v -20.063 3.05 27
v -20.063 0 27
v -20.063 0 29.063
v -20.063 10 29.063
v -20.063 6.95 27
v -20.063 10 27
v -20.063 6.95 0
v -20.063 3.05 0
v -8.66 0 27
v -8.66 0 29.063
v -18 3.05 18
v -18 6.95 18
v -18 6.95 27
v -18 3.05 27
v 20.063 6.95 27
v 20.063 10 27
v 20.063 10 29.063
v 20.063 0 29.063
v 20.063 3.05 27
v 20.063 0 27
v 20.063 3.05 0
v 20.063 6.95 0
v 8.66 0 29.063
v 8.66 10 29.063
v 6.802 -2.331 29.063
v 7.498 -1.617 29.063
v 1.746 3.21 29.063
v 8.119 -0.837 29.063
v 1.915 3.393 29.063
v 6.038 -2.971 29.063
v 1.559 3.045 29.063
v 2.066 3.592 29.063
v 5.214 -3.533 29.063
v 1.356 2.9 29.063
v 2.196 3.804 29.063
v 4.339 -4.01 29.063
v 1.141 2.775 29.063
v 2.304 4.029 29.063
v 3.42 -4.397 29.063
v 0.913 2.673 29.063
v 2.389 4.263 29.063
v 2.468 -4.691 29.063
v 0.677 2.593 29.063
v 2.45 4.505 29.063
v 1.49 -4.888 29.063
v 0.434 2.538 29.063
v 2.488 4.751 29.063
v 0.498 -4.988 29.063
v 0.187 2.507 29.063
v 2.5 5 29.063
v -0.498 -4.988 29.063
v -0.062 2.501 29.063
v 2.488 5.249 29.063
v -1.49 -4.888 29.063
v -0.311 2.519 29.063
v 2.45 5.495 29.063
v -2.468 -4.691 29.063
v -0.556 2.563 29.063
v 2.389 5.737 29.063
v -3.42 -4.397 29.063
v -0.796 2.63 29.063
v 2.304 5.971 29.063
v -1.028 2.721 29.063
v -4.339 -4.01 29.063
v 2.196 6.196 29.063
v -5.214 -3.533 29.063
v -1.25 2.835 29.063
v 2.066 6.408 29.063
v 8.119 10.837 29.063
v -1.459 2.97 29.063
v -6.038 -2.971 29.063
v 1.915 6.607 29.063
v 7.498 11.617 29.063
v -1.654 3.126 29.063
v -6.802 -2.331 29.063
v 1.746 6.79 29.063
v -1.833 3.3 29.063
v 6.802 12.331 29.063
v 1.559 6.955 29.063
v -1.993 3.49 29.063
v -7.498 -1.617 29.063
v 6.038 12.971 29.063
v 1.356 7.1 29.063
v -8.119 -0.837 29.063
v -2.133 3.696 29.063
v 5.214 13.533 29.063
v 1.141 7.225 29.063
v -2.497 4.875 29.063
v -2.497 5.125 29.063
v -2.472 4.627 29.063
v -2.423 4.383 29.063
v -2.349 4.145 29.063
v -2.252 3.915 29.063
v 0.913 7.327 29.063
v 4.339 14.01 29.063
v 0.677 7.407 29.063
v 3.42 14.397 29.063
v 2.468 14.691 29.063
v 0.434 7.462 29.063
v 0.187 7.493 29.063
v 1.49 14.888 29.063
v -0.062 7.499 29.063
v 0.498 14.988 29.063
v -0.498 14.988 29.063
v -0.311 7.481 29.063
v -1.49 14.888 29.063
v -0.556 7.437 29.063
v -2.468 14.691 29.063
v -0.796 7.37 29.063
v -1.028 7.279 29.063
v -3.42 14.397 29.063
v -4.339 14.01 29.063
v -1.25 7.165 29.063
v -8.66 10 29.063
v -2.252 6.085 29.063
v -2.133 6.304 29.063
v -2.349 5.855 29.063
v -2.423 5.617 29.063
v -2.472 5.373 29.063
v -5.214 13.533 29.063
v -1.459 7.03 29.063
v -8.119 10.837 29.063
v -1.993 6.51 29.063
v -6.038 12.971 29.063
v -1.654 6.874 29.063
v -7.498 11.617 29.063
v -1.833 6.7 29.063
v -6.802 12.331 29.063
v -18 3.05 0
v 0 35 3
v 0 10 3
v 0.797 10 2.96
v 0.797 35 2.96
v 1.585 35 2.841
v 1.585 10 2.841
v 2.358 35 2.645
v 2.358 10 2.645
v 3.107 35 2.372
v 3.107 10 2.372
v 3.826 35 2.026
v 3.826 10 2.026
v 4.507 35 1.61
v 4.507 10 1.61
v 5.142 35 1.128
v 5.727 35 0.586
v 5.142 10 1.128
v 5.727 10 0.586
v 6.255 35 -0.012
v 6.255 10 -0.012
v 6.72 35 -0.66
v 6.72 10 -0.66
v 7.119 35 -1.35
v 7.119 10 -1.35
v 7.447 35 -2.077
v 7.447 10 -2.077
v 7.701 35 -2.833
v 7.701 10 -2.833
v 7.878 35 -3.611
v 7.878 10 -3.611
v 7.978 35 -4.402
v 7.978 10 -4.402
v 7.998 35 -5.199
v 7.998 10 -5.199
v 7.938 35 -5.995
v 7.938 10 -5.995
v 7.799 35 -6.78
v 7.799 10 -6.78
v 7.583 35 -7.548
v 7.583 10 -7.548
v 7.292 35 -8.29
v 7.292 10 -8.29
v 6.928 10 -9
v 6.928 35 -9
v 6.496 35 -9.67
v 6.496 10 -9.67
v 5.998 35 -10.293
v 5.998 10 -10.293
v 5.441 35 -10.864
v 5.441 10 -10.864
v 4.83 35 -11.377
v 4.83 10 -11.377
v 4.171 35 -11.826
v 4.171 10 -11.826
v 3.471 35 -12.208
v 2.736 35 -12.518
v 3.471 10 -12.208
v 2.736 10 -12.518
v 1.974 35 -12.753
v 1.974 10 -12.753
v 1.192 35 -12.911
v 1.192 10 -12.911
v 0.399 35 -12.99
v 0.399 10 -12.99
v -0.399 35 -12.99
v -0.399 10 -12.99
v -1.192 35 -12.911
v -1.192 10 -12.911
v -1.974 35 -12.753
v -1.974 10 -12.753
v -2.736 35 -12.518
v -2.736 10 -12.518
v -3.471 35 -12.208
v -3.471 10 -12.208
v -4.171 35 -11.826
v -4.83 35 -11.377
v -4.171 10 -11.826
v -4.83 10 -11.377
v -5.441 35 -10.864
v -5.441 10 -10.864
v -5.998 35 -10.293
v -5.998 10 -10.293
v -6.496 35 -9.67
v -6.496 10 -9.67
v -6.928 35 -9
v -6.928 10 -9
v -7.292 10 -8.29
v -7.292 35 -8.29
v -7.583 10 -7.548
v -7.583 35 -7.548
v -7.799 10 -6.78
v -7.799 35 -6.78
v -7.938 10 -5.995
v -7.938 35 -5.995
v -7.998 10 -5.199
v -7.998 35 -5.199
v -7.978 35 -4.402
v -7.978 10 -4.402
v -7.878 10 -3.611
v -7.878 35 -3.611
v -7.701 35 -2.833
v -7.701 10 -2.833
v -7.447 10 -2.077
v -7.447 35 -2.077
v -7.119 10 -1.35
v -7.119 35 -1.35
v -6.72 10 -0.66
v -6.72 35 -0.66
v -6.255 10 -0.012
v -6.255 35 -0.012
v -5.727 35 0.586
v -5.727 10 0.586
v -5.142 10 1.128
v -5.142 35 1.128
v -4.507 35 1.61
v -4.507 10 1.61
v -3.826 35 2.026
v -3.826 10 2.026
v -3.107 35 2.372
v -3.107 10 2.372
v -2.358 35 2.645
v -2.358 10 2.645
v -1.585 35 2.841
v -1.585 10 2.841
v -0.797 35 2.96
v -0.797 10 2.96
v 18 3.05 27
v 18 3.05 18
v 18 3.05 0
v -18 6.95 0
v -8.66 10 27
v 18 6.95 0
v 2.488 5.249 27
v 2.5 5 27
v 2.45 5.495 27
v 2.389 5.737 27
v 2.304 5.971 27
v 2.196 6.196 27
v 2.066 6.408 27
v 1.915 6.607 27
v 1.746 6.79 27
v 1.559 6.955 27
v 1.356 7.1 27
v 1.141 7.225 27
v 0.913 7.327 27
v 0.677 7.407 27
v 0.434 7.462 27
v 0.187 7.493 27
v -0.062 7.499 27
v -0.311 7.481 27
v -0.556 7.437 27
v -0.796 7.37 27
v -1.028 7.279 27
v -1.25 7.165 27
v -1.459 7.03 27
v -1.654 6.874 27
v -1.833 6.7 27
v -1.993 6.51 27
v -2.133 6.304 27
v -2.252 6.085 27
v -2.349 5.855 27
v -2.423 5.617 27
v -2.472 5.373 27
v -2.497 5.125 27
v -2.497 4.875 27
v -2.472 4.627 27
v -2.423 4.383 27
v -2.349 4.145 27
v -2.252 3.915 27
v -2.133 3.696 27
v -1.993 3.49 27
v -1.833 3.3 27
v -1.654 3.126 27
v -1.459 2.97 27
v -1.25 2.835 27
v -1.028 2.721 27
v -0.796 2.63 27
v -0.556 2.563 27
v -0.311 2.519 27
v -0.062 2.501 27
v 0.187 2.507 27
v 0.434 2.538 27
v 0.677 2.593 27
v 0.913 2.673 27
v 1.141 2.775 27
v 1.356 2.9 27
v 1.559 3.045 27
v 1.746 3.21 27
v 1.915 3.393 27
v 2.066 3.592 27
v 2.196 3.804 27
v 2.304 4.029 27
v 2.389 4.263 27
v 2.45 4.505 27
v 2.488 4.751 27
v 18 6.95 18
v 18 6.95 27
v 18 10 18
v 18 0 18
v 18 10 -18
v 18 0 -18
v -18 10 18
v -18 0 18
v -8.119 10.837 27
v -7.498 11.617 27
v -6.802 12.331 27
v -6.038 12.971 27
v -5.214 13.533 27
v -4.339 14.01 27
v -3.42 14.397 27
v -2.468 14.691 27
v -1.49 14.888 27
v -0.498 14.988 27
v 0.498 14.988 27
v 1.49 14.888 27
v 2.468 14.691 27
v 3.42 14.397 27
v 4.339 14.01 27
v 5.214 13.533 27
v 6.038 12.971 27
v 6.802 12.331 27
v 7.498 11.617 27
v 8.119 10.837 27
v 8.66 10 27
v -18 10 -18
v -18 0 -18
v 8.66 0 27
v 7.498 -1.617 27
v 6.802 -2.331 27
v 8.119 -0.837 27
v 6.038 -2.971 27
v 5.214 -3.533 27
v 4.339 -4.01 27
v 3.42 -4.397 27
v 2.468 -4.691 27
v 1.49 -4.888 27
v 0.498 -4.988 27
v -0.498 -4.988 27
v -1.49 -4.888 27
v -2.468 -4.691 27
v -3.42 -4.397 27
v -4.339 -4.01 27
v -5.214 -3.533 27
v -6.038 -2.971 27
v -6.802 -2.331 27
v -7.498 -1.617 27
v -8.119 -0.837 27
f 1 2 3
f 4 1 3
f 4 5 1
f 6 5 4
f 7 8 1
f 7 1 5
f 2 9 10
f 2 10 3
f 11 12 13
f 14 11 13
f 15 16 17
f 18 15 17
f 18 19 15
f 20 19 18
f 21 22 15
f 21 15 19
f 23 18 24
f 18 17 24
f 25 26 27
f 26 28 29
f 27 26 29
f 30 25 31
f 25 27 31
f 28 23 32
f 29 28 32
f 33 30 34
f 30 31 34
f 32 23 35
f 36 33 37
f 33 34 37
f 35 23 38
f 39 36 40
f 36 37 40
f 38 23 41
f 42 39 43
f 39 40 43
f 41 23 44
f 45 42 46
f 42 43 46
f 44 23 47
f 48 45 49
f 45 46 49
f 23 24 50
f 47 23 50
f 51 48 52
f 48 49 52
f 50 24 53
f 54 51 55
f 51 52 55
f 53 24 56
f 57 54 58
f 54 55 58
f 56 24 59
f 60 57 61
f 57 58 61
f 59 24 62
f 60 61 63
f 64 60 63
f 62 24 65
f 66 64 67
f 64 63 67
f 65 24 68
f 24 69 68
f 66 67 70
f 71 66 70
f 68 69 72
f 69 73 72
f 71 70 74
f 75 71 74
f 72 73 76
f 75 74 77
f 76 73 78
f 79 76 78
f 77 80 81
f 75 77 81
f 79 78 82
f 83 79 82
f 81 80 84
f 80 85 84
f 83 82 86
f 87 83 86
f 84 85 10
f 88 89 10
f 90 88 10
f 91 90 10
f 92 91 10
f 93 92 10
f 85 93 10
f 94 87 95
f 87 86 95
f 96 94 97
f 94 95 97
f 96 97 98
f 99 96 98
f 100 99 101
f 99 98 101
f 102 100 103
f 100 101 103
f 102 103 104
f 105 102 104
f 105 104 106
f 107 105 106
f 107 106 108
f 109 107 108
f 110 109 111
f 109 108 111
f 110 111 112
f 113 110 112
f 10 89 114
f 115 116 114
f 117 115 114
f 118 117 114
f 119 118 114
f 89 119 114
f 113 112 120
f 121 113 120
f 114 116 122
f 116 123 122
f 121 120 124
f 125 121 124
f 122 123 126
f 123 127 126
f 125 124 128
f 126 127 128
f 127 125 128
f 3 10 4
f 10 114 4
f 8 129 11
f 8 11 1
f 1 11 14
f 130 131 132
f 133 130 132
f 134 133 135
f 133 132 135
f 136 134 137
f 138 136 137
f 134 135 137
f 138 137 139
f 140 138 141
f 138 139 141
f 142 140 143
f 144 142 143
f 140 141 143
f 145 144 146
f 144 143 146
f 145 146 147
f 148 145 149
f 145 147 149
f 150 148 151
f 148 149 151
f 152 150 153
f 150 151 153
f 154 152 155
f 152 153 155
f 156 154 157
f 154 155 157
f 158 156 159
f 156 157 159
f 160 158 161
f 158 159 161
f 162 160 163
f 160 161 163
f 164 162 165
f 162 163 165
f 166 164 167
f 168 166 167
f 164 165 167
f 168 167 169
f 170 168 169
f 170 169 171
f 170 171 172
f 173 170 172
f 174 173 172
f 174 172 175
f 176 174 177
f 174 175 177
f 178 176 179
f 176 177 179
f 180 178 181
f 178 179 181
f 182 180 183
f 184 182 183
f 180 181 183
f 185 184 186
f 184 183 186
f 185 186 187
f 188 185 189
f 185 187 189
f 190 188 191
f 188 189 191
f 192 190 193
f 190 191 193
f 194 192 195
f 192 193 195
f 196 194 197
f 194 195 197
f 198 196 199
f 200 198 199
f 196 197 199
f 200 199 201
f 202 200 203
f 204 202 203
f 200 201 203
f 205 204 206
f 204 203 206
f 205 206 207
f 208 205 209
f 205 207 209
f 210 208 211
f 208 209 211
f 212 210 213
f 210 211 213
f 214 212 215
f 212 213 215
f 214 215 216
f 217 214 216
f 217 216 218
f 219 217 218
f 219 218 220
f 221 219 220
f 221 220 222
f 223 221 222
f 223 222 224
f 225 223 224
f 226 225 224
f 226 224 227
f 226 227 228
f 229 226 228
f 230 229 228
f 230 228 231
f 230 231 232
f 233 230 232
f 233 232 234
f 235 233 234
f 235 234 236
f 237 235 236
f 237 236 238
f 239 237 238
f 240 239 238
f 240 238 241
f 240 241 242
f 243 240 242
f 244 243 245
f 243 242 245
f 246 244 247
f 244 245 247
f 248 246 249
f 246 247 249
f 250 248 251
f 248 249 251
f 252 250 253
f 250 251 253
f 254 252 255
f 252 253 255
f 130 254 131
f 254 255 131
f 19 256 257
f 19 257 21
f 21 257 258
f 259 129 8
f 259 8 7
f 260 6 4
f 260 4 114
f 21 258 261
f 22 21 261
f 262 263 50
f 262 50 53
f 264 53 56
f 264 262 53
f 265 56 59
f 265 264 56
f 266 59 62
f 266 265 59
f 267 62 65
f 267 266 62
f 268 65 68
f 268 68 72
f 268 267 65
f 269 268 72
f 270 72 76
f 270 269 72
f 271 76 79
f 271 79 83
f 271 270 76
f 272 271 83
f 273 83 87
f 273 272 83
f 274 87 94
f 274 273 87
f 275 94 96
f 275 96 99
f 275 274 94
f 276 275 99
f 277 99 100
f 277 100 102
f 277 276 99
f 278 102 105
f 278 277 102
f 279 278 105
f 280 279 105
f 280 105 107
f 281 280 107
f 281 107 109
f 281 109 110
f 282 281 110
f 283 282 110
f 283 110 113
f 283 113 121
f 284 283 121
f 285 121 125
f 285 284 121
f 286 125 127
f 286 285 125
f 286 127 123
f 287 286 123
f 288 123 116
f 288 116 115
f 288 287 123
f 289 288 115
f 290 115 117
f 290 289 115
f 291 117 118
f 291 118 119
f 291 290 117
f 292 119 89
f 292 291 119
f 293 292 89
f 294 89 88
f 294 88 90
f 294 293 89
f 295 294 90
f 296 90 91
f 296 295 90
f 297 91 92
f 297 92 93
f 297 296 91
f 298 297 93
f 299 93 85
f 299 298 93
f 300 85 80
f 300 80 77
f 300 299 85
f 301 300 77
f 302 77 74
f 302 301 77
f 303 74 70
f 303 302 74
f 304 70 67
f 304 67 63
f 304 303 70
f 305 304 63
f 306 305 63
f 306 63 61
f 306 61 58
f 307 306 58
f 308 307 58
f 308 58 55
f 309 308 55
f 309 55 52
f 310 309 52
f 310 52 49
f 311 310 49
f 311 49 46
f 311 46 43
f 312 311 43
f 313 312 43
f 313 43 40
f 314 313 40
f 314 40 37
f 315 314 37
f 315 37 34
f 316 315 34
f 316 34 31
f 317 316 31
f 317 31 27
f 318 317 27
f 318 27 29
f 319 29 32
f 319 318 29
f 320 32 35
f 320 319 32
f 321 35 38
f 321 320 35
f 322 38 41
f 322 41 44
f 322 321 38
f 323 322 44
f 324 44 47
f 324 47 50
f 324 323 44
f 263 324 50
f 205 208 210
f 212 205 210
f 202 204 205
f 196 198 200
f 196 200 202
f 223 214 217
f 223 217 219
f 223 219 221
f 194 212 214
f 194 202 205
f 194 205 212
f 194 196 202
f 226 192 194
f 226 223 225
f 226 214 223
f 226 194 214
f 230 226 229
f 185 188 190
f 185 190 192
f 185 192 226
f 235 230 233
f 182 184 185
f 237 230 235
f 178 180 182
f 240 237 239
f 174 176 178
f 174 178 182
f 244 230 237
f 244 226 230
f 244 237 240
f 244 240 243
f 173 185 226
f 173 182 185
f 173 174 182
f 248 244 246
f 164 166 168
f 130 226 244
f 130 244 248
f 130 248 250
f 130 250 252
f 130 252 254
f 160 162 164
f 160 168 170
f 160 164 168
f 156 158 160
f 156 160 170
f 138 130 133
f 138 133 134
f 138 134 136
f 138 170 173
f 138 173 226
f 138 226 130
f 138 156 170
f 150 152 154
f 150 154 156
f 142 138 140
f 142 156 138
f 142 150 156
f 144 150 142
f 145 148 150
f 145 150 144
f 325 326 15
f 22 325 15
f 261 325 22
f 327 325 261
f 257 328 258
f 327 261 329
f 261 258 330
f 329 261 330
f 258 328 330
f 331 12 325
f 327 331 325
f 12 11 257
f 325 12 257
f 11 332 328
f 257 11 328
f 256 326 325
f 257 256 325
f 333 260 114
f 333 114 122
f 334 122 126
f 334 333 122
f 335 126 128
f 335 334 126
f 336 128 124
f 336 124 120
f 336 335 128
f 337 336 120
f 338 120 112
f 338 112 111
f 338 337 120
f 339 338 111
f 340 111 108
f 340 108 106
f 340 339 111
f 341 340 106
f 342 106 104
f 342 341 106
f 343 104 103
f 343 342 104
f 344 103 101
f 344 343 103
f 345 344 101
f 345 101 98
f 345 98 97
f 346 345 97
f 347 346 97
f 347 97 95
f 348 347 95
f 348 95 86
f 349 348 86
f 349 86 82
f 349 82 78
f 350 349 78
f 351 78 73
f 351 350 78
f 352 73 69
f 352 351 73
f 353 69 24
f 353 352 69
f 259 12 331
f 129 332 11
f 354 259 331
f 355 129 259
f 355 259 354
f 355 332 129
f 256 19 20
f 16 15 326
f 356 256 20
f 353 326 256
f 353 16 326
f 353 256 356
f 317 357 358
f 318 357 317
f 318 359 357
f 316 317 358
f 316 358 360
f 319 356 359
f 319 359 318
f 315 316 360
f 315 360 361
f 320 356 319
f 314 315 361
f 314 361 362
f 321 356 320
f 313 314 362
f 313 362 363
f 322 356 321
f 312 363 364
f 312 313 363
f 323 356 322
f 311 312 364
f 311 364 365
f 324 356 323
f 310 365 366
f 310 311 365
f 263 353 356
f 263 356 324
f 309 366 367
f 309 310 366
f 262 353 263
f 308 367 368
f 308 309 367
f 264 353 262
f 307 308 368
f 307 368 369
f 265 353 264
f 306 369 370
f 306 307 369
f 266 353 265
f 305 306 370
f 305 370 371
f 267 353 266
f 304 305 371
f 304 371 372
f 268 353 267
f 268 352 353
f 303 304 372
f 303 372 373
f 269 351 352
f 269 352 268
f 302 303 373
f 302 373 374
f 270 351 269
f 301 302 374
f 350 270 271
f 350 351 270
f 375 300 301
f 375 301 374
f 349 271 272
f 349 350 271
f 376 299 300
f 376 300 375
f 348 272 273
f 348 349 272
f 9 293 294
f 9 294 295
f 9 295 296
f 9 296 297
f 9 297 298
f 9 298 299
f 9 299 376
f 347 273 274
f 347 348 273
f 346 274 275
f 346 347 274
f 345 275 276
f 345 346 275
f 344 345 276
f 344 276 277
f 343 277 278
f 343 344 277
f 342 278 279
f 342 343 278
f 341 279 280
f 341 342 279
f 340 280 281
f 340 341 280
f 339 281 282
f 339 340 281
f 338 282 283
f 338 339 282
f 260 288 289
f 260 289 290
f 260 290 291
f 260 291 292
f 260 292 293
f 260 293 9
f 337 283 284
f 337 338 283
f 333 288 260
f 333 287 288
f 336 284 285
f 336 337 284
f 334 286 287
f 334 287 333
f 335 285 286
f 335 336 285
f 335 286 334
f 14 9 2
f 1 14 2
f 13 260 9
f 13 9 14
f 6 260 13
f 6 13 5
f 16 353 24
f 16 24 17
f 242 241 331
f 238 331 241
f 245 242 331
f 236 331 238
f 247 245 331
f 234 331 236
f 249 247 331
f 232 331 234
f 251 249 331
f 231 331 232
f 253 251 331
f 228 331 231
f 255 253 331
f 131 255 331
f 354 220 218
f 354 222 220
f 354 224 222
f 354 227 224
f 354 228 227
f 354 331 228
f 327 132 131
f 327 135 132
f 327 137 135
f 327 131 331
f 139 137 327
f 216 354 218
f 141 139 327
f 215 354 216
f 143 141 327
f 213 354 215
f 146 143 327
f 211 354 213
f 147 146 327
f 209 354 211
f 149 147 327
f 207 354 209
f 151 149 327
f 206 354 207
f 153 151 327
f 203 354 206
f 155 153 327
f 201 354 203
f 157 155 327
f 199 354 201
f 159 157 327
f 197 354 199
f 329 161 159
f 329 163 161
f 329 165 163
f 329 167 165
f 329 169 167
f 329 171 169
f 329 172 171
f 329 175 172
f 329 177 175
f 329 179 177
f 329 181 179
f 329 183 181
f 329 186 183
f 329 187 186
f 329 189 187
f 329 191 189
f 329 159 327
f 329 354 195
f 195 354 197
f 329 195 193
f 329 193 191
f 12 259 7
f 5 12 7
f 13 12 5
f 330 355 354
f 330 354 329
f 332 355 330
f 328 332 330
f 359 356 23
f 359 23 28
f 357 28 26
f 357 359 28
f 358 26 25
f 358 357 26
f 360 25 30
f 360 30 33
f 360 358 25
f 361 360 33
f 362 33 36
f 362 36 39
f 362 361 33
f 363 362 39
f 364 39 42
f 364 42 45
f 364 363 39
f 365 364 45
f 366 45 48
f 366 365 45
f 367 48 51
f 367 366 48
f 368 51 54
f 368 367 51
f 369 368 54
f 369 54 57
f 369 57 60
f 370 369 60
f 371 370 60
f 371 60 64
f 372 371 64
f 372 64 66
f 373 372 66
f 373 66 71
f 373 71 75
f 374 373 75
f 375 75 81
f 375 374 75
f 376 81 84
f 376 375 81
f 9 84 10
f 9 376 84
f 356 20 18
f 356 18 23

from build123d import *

# Parameters (mm, degrees)
SKETCH_1_W      = 36
SKETCH_1_H      = 36
EXTRUDE_1_DEPTH = 10
SKETCH_3_R      = 8
EXTRUDE_2_DEPTH = 25
SKETCH_4_W      = 27
SKETCH_4_H      = 3.9
EXTRUDE_3_DEPTH = 2.063094661
SKETCH_5_W      = 27
SKETCH_5_H      = 3.9
EXTRUDE_4_DEPTH = 2.063094661
SKETCH_6_R      = 2.5
EXTRUDE_5_DEPTH = 2.063094661


with BuildPart() as part:
    # 草图1 → 凸台-拉伸1 (new body)
    with BuildSketch(Plane(origin=(0, 0, 0), x_dir=(1, 0, 0), z_dir=(0, 1, 0))):
        Rectangle(SKETCH_1_W, SKETCH_1_H)
    extrude(amount=EXTRUDE_1_DEPTH)

    # 草图3 → 凸台-拉伸2 (add)
    with BuildSketch(Plane(origin=(0, 10, 0), x_dir=(1, 0, 0), z_dir=(0, 1, 0))):
        with Locations(Location((0, 5, 0), (0, 0, 270))):
            Circle(SKETCH_3_R)
    extrude(amount=EXTRUDE_2_DEPTH)

    # 草图4 → 凸台-拉伸3 (add)
    with BuildSketch(Plane.ZY.offset(18)):
        with Locations((13.5, 5)):
            Rectangle(SKETCH_4_W, SKETCH_4_H)
    extrude(amount=EXTRUDE_3_DEPTH)

    # 草图5 → 凸台-拉伸4 (add)
    with BuildSketch(Plane(origin=(18, 0, 0), x_dir=(0, 0, -1), z_dir=(1, 0, 0))):
        with Locations((-13.5, 5)):
            Rectangle(SKETCH_5_W, SKETCH_5_H)
    extrude(amount=EXTRUDE_4_DEPTH)

    # 草图6 → 凸台-拉伸5 (add)
    with BuildSketch(Plane.XY.offset(27)):
        with BuildLine():
            Line((20.063094661, 3.05), (20.063094661, 0))
            Line((20.063094661, 0), (8.660254038, 0))
            ThreePointArc((8.660254038, 0), (0, -5), (-8.660254038, 0))
            Line((-8.660254038, 0), (-20.063094661, 0))
            Line((-20.063094661, 0), (-20.063094661, 10))
            Line((-20.063094661, 10), (-8.660254038, 10))
            ThreePointArc((-8.660254038, 10), (0, 15), (8.660254038, 10))
            Line((8.660254038, 10), (20.063094661, 10))
            Line((20.063094661, 10), (20.063094661, 3.05))
        make_face()
        with Locations((0, 5)):
            Circle(SKETCH_6_R, mode=Mode.SUBTRACT)
    extrude(amount=EXTRUDE_5_DEPTH)


solid = part.part
